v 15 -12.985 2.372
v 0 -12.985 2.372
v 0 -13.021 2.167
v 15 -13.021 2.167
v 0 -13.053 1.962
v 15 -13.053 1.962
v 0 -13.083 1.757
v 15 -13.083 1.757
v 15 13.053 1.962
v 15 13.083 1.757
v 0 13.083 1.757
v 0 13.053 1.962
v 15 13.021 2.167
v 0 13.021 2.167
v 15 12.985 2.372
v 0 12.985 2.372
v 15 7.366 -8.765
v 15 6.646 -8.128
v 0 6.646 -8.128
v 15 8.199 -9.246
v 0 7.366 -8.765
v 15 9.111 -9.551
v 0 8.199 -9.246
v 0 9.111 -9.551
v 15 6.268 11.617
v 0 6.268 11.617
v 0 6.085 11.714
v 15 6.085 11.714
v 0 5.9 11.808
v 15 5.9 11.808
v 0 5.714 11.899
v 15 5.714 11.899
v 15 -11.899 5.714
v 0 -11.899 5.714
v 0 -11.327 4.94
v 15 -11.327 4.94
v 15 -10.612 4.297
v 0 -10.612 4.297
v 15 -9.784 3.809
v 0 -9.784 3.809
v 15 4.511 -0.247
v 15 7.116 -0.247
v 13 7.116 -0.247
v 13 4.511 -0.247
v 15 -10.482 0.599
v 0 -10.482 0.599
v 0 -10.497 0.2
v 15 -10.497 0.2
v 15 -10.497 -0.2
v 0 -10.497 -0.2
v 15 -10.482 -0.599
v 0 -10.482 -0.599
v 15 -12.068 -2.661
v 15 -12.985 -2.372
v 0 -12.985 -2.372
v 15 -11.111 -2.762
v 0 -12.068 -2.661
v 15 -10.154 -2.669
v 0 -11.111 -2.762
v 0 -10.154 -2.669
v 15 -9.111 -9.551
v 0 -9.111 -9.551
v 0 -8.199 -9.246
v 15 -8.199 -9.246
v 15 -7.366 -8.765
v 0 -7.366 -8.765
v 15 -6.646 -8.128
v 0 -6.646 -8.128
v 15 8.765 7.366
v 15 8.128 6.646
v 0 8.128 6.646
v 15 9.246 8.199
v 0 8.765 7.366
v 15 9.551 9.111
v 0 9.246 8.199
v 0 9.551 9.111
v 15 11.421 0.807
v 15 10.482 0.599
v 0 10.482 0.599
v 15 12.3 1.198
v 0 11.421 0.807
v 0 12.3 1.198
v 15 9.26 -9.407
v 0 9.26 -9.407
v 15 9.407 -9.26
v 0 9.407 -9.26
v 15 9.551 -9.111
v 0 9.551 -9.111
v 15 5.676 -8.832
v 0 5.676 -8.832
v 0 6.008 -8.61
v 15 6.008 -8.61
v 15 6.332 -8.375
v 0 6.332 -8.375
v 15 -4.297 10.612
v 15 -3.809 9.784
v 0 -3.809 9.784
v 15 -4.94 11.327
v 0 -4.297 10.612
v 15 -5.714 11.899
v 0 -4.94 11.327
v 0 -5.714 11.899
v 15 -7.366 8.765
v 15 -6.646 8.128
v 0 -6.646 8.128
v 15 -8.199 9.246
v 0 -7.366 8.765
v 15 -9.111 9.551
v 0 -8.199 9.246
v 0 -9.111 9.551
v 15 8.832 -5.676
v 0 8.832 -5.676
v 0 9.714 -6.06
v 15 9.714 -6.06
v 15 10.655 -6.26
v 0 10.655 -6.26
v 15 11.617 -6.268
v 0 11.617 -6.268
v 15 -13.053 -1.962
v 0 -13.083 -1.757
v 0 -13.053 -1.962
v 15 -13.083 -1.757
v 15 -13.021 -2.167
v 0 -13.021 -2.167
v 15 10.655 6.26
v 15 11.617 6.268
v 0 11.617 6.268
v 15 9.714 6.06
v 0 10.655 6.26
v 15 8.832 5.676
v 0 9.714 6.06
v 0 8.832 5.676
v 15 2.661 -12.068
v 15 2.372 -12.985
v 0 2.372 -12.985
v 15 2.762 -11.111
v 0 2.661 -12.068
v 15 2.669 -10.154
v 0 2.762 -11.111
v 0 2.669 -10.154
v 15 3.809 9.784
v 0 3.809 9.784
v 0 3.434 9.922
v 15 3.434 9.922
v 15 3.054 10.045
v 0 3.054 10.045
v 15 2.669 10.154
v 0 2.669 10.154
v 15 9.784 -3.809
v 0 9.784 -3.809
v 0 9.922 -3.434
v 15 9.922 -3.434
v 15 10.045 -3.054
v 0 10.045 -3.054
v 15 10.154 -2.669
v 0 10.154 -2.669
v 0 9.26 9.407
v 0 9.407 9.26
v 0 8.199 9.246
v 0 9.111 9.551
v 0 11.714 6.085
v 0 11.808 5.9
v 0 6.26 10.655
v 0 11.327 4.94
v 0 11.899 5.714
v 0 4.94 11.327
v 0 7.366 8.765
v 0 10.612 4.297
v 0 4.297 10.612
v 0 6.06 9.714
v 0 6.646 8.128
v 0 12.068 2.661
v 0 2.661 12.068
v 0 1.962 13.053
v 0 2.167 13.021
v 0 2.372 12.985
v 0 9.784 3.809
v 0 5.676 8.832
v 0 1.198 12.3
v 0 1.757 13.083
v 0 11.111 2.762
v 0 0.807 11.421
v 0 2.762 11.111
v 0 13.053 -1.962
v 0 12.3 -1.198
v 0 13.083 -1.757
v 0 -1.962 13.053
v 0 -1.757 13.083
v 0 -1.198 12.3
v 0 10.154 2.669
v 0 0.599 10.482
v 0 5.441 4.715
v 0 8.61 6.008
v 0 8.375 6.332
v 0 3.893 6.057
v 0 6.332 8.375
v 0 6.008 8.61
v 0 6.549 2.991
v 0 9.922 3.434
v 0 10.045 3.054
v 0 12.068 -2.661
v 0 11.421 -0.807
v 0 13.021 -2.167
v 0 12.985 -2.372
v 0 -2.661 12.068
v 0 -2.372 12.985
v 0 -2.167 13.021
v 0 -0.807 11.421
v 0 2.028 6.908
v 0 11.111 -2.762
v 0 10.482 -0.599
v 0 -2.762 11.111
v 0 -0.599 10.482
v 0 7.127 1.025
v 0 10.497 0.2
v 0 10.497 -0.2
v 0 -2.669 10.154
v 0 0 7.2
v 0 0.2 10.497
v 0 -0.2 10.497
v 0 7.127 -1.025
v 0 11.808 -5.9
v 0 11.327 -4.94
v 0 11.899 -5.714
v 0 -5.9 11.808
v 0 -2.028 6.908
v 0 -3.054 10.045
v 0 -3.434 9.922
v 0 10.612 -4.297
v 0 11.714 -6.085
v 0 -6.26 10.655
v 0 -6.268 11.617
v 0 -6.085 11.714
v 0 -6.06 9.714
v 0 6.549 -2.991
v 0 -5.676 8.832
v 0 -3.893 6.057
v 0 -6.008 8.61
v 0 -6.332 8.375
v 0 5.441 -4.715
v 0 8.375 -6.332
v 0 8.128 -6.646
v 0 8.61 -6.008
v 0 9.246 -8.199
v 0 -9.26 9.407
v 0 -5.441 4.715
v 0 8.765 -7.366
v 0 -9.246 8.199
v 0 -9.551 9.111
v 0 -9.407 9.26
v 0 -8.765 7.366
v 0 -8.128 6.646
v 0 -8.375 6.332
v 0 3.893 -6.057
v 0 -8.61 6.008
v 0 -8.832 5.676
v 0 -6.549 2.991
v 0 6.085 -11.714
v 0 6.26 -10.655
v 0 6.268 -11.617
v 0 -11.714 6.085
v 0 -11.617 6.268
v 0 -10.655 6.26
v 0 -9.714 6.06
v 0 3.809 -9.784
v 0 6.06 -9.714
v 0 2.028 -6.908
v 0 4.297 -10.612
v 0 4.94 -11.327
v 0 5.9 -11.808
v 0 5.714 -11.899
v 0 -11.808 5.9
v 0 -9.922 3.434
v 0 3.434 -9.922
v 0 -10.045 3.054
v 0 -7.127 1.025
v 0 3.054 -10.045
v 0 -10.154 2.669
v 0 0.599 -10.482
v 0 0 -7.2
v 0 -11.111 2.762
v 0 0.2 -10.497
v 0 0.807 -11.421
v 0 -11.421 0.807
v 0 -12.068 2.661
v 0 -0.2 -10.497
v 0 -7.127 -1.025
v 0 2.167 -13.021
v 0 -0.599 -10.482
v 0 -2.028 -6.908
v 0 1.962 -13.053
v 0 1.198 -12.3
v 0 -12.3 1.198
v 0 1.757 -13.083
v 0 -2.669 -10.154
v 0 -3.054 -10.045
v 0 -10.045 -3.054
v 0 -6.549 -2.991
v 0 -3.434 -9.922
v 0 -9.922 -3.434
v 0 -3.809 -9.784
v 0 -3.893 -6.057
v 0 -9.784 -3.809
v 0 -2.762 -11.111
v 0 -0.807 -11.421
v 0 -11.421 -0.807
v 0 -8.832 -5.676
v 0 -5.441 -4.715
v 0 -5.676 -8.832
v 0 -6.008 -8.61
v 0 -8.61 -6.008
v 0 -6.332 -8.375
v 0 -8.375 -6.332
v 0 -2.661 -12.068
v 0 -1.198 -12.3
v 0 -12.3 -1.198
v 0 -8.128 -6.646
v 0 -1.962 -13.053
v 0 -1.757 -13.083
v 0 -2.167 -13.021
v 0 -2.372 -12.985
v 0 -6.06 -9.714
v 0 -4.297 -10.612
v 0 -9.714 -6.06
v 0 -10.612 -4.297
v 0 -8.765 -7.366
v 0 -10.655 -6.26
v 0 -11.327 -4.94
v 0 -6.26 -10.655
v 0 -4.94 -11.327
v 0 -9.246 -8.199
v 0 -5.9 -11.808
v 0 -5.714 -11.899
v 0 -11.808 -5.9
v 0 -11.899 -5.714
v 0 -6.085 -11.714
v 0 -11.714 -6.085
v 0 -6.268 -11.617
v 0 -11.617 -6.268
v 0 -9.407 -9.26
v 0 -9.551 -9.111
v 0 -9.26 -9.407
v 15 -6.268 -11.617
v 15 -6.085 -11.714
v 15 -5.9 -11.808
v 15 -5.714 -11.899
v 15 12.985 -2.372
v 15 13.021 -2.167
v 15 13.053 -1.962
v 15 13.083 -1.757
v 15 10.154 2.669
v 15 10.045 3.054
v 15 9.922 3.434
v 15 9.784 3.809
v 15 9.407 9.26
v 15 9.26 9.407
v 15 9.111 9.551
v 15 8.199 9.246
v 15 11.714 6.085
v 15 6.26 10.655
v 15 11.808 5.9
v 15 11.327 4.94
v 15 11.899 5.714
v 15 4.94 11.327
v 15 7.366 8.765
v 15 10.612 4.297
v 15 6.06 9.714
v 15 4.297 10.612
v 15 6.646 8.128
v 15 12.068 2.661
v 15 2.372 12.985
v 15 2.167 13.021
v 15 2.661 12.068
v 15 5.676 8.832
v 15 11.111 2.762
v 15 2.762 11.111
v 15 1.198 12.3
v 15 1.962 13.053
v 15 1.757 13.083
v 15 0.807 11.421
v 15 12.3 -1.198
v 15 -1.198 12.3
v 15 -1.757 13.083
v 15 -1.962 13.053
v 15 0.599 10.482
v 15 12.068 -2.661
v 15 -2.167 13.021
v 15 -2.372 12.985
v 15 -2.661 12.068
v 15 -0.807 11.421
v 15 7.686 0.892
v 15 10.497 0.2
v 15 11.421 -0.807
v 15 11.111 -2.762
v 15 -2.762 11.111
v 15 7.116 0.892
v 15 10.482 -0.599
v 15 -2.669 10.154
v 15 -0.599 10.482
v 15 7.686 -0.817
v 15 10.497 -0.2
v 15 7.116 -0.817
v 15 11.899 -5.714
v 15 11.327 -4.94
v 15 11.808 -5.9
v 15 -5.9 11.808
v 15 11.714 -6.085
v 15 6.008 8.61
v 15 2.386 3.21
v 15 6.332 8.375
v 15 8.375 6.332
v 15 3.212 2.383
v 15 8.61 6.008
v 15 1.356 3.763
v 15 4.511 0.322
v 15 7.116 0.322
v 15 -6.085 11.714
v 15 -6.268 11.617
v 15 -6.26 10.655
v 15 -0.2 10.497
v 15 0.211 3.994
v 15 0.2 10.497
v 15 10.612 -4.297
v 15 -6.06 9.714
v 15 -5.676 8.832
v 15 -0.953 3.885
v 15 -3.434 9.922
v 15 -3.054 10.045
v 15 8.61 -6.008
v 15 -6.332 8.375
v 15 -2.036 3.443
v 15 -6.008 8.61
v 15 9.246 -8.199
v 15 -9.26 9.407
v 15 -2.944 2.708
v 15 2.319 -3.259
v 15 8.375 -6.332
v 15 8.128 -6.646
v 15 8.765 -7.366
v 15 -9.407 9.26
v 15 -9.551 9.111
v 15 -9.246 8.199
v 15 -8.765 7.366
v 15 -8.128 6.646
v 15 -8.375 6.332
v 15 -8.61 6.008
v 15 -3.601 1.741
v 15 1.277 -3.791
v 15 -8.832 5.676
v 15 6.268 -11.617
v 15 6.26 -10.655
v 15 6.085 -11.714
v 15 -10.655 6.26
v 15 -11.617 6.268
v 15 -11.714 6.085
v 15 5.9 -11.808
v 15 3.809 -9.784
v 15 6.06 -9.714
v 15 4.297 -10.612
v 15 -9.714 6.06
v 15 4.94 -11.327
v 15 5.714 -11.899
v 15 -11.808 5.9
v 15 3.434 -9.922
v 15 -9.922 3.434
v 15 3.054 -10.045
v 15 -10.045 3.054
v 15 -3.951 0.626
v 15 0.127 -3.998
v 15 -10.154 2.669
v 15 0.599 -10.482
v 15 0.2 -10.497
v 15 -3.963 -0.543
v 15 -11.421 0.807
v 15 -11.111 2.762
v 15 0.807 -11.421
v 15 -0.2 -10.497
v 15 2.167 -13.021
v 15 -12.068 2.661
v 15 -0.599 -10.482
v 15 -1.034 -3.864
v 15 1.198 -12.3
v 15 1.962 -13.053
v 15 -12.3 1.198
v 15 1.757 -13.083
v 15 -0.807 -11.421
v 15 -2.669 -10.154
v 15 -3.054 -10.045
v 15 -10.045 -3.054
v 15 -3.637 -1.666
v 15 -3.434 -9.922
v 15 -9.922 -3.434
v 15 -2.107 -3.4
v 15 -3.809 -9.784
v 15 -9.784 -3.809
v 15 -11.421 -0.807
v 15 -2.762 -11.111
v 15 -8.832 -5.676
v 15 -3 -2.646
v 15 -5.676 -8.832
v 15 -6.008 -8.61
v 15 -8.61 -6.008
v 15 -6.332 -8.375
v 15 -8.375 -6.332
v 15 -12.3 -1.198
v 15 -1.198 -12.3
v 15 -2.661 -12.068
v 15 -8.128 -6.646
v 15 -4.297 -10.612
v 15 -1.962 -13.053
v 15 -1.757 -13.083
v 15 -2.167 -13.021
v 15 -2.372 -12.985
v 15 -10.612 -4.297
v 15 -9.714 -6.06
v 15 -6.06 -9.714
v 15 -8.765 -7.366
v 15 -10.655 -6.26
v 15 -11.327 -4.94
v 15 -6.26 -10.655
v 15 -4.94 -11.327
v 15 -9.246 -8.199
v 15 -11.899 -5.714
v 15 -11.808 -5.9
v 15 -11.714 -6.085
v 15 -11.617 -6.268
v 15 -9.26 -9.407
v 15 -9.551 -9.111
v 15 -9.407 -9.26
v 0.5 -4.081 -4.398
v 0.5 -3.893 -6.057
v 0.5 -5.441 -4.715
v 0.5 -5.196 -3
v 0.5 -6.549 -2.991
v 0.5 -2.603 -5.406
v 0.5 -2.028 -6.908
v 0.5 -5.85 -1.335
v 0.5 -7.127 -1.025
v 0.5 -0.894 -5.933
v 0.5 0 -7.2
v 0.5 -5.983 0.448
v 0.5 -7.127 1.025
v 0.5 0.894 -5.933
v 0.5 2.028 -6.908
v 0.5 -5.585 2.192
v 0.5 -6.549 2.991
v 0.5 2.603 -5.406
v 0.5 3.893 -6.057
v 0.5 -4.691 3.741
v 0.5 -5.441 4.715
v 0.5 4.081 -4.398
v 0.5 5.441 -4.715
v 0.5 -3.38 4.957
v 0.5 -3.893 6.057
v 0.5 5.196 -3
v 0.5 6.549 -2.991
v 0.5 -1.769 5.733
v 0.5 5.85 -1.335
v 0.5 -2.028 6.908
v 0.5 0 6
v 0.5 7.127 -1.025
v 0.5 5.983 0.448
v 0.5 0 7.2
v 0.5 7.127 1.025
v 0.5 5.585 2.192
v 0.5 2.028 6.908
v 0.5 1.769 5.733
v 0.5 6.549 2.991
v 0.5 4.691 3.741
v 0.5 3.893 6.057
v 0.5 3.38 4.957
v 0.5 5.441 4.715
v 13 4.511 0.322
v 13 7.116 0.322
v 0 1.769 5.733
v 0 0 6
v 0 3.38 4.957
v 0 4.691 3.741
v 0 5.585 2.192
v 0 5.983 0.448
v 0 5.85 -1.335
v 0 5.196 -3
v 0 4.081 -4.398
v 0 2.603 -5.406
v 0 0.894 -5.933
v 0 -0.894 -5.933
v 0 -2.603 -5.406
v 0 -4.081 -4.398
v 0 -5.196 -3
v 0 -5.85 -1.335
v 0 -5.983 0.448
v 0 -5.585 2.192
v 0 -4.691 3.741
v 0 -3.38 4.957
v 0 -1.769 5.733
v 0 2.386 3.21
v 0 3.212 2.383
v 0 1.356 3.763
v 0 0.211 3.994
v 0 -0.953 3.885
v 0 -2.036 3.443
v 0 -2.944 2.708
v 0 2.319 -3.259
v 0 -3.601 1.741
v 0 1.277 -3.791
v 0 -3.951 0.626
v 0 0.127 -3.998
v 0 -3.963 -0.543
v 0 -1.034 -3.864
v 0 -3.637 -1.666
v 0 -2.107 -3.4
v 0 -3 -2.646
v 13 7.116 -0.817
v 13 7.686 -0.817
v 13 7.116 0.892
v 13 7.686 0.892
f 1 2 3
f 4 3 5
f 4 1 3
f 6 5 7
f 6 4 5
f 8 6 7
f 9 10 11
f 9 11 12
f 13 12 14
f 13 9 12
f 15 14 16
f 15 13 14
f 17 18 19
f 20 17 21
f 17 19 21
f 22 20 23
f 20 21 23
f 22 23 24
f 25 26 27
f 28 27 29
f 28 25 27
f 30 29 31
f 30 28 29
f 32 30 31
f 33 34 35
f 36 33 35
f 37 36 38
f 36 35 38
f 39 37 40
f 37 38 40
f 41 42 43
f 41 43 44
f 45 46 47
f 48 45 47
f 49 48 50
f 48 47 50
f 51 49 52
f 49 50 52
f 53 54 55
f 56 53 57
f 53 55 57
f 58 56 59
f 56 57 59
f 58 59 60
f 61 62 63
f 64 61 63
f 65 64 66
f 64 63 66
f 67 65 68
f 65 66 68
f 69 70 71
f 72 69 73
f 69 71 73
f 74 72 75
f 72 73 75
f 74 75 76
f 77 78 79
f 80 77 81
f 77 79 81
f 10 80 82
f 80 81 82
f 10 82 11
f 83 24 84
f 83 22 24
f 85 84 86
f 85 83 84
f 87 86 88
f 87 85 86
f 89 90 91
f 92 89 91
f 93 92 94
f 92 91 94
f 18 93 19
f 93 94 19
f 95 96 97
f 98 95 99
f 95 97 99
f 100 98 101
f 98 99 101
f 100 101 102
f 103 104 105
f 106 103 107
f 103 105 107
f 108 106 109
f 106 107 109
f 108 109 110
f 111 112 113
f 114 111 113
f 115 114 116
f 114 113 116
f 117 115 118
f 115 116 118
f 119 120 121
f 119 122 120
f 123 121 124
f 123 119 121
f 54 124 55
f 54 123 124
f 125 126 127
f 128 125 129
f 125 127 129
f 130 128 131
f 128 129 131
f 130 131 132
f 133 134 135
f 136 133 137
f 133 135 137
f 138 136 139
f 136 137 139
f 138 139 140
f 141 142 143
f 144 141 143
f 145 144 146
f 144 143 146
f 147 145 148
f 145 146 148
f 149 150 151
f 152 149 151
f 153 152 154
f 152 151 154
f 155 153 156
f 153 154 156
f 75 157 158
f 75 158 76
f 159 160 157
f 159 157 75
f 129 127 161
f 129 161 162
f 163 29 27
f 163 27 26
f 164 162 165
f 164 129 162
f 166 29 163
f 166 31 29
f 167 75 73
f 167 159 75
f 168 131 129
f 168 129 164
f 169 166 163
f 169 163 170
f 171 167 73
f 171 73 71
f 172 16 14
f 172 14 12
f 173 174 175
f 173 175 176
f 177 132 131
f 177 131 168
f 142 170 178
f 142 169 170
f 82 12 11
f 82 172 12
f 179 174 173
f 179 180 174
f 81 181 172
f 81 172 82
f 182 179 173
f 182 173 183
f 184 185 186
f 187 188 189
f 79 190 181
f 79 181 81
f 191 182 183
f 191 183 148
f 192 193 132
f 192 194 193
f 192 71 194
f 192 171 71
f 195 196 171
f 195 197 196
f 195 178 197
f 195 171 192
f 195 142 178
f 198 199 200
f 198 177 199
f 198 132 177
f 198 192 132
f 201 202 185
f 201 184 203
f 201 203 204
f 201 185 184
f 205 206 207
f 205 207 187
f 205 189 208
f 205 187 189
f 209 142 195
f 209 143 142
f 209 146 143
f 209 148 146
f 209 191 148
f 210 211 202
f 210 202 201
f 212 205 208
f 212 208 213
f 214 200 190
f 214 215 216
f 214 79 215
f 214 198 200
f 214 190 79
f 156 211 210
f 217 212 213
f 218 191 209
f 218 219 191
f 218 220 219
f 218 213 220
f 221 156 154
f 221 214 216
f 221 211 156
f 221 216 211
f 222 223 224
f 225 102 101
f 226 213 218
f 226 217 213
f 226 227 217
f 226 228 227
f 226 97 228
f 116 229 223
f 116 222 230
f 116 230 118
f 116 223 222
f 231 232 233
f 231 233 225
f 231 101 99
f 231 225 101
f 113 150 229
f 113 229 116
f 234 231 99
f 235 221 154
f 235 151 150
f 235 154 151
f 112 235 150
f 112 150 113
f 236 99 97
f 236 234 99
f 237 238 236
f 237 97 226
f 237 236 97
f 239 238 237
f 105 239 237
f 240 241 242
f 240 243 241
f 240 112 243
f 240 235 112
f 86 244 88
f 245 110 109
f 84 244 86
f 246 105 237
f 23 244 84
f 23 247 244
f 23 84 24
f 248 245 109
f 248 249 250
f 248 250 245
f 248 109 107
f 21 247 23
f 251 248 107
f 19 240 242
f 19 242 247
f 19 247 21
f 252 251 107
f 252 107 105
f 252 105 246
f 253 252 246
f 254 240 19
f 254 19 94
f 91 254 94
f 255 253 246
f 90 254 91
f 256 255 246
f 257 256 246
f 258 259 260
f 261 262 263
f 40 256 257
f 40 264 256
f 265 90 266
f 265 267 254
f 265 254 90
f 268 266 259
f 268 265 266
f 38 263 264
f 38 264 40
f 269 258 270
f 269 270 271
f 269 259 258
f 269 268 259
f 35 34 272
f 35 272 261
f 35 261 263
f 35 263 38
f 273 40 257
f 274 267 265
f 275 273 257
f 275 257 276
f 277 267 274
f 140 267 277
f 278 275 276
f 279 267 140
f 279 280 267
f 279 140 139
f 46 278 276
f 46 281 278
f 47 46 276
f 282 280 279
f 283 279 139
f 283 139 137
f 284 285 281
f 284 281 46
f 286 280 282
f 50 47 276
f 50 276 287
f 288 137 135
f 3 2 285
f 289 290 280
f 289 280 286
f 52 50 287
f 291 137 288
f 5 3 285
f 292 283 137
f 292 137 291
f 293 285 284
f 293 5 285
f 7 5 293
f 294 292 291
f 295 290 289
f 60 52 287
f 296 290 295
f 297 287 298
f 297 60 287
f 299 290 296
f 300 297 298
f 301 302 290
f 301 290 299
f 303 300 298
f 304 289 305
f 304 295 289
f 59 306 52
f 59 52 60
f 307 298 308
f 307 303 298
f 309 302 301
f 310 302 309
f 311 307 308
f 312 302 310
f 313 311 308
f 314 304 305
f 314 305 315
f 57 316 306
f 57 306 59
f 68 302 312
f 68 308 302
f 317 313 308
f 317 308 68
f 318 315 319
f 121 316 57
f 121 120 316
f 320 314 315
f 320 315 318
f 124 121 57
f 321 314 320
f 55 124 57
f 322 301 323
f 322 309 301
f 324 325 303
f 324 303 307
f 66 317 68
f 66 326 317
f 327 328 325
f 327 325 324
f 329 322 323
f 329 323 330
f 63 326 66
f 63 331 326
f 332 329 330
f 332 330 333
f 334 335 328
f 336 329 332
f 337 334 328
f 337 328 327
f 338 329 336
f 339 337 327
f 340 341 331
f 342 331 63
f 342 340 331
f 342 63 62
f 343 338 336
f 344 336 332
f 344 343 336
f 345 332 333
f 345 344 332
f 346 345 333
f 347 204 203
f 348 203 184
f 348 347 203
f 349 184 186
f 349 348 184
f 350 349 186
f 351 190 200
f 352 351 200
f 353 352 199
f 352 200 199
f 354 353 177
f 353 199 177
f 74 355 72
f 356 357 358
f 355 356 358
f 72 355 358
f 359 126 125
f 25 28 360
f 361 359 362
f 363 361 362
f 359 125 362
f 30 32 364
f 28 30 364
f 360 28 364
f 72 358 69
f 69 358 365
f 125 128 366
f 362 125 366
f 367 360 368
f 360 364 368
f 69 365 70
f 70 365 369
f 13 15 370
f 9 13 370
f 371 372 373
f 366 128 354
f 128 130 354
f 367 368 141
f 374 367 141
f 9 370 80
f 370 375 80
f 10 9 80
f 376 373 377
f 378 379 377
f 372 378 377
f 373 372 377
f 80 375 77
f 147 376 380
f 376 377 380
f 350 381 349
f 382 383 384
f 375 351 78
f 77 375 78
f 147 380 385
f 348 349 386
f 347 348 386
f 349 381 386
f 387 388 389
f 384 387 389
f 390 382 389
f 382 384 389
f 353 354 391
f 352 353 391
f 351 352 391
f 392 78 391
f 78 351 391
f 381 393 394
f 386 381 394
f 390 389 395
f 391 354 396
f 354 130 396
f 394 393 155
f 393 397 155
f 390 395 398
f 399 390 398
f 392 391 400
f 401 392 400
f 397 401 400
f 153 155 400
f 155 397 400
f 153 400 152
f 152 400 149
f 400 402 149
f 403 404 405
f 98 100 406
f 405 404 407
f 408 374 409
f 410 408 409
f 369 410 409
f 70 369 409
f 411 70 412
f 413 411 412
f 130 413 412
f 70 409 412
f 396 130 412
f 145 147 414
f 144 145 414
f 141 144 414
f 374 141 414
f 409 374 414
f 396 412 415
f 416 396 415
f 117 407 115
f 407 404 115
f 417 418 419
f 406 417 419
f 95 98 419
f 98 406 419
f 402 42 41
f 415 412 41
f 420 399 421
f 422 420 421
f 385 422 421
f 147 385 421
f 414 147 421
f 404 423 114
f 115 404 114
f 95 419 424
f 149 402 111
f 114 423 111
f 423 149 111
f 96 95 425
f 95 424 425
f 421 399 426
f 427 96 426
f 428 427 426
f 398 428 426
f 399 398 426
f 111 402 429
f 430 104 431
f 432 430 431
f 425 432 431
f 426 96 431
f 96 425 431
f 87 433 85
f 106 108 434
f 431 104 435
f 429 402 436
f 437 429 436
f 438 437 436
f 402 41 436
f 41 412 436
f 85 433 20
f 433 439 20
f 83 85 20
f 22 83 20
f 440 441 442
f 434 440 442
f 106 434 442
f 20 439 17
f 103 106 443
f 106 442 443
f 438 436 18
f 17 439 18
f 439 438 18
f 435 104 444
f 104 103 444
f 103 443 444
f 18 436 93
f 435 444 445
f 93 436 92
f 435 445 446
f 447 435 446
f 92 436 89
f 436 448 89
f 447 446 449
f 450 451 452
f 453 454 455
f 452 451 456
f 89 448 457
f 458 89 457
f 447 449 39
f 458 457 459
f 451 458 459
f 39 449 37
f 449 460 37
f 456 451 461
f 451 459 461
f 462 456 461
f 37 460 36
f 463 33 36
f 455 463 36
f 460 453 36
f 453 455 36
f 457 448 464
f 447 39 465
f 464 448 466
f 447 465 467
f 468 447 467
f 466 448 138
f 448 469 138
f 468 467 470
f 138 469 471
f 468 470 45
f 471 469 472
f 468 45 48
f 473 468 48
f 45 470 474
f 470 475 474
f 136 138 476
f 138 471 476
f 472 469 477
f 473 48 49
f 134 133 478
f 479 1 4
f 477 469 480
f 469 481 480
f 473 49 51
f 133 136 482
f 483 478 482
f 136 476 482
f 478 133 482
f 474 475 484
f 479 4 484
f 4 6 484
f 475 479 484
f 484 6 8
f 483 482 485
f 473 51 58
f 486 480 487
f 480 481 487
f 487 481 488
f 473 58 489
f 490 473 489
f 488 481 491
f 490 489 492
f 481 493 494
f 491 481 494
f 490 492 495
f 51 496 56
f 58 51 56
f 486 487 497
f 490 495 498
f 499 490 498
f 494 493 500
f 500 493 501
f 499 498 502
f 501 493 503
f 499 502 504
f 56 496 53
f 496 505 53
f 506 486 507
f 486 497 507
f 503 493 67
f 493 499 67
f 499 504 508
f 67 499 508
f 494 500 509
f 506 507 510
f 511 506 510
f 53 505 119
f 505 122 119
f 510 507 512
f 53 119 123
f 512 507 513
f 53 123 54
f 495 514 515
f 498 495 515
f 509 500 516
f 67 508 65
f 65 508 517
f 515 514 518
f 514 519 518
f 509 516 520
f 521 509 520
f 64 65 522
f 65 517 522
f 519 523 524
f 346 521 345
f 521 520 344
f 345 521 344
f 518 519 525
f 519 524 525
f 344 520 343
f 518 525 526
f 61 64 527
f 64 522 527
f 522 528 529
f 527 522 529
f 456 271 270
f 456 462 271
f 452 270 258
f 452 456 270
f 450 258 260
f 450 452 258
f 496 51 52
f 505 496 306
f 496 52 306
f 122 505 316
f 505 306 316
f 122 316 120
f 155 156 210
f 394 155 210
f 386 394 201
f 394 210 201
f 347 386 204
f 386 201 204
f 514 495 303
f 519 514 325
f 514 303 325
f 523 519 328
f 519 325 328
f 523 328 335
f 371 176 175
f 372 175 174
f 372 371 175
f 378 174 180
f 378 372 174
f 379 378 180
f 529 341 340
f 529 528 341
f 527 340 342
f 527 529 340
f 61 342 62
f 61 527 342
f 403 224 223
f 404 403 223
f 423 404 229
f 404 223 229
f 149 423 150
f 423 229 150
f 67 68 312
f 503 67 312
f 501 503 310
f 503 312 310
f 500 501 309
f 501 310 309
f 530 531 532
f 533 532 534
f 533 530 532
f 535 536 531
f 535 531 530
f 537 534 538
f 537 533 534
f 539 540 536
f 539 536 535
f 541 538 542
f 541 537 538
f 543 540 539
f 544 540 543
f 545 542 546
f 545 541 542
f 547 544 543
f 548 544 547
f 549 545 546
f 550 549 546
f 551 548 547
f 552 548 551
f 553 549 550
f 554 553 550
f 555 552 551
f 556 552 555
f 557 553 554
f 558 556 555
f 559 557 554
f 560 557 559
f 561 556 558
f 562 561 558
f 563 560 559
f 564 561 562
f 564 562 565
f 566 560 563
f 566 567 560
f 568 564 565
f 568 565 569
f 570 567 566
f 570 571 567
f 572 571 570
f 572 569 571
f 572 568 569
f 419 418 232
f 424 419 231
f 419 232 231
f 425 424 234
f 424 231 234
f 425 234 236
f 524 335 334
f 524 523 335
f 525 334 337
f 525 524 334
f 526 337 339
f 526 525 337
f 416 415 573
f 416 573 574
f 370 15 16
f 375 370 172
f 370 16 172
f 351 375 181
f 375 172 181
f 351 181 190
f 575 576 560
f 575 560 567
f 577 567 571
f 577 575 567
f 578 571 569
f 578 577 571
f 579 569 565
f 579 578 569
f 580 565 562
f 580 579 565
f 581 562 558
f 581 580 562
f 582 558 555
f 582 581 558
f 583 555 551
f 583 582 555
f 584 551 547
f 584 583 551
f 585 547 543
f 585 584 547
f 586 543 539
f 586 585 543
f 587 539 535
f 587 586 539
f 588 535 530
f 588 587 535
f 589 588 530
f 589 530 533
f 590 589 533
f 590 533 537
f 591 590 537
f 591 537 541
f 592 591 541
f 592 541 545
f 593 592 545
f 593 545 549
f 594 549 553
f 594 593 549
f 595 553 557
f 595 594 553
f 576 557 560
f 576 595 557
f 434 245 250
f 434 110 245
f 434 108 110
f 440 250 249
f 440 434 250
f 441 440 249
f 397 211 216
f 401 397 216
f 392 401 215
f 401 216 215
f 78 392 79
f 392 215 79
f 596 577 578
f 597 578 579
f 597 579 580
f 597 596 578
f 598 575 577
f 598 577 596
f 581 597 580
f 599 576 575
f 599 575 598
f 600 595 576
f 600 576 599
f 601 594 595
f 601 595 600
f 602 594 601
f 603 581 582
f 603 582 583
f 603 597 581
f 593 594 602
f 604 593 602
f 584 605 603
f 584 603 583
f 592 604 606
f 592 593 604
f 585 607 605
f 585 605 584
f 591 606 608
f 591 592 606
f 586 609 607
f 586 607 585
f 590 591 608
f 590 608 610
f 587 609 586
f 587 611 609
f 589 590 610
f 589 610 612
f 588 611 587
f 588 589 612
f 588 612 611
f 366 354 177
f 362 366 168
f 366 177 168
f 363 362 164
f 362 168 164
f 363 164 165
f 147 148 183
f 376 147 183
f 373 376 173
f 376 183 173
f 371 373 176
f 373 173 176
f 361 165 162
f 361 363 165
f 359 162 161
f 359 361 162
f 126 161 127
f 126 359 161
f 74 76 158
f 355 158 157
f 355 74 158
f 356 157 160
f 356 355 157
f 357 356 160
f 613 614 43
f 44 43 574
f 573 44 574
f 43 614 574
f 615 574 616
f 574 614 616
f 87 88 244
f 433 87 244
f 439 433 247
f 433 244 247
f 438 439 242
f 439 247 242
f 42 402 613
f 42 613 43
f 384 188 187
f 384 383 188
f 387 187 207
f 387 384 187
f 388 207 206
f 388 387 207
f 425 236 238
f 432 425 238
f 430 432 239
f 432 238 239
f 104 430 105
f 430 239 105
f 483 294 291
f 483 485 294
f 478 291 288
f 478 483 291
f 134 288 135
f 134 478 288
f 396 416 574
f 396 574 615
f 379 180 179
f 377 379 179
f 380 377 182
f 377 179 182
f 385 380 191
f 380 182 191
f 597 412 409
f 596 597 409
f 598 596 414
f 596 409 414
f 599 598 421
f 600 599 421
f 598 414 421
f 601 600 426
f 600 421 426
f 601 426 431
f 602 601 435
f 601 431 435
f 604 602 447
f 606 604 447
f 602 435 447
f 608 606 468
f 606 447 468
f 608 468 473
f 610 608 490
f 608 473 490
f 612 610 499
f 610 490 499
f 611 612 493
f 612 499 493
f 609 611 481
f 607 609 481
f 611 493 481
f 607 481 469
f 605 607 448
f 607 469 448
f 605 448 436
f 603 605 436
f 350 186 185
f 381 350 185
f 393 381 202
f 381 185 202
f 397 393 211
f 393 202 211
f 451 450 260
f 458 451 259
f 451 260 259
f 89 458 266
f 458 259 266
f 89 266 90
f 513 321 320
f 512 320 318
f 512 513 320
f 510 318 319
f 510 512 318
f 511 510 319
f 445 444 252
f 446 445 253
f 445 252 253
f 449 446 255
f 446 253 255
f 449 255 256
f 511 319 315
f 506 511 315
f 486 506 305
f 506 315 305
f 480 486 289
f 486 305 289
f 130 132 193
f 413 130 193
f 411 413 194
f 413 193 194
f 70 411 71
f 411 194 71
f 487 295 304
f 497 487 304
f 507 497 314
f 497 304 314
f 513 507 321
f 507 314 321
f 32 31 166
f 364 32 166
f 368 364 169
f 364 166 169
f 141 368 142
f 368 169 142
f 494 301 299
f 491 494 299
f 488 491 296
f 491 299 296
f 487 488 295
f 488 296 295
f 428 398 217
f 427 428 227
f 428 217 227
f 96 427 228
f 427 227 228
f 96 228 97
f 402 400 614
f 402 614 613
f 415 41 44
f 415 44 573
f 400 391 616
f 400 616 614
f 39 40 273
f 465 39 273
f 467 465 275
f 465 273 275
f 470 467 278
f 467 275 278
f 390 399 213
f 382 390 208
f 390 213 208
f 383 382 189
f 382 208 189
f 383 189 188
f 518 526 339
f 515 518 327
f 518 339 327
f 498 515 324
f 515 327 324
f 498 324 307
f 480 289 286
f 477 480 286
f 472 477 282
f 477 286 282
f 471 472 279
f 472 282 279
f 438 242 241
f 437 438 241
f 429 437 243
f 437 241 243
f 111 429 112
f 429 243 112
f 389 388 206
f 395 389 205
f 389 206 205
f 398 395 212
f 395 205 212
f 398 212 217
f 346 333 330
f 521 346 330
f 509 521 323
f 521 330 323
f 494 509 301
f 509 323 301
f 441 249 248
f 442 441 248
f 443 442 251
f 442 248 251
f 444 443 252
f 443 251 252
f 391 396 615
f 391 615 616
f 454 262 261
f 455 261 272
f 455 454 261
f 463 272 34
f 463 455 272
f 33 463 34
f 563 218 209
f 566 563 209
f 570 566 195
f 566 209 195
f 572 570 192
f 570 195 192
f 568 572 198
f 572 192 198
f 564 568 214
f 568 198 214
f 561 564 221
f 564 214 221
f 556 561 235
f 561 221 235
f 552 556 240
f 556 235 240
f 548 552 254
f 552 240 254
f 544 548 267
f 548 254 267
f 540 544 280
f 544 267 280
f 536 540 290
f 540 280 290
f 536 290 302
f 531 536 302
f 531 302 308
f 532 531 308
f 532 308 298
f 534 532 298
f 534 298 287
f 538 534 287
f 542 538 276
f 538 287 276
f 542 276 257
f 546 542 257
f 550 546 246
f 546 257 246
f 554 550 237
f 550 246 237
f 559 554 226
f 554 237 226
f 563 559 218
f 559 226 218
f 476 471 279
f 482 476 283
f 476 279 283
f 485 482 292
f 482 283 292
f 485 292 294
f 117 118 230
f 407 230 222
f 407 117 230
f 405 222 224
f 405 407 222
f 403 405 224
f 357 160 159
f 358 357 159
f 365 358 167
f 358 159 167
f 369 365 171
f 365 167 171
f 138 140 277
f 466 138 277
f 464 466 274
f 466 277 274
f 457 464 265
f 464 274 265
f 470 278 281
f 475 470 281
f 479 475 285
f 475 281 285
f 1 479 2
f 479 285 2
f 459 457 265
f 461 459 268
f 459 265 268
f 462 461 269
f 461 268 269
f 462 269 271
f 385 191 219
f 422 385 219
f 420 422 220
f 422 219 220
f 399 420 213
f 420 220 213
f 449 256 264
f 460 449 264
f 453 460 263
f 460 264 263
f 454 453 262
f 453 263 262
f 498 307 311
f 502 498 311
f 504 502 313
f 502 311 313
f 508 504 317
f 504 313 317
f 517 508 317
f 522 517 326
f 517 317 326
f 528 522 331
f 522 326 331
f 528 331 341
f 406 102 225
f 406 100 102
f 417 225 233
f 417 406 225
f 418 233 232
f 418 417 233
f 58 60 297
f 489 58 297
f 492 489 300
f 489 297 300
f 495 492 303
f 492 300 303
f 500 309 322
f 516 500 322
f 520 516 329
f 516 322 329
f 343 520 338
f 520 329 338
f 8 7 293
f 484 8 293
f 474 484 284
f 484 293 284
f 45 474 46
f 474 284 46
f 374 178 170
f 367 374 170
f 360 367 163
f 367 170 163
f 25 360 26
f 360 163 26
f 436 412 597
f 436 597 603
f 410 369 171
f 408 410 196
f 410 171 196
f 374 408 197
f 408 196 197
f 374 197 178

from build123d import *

# Parameters (mm, degrees)
BASPROSKE_W         = 15
BASPROSKE_H         = 13.2
TOOTHCUT_DEPTH      = 24.947442452
TEETHCUTS_COUNT     = 20
TEETHCUTS_ANGLE     = 342
BORSKE_R            = 4
BORE_DEPTH          = 50.0000508
BOSS_EXTRUDE1_START = -15
BOSS_EXTRUDE1_DEPTH = 15
SKETCH2_R           = 7.2
SKETCH2_R_2         = 6
CUT_EXTRUDE1_DEPTH  = 0.5
CUT_EXTRUDE2_DEPTH  = 2


with BuildPart() as part:
    # BasProSke → Base-Revolve (revolve)
    with BuildSketch(Plane(origin=(0, 0, 0), x_dir=(1, 0, 0), z_dir=(0, 1, 0)), mode=Mode.PRIVATE) as base_revolve_sk:
        with Locations((7.5, 6.6)):
            Rectangle(BASPROSKE_W, BASPROSKE_H)
    revolve(base_revolve_sk.sketch.rotate(Axis((-10, 0, 0), (1, 0, 0)), 180), axis=Axis((-10, 0, 0), (1, 0, 0)))

    # TooCutSke → ToothCut (cut, through all)
    with BuildSketch(Plane(origin=(0, 0, 0), x_dir=(0, 0, -1), z_dir=(1, 0, 0))):
        with BuildLine():
            ThreePointArc((0.599012827, 10.48189795), (0, 10.499), (-0.599012827, 10.48189795))
            ThreePointArc((-0.599012827, 10.48189795), (-0.986906343, 11.883983562), (-1.777012823, 13.105473306))
            ThreePointArc((-1.777012823, 13.105473306), (0, 13.2254), (1.777012823, 13.105473306))
            ThreePointArc((1.777012823, 13.105473306), (0.986906343, 11.883983562), (0.599012827, 10.48189795))
        make_face()
    toothcut = extrude(amount=TOOTHCUT_DEPTH, mode=Mode.SUBTRACT)

    # TeethCuts: ToothCut ×20 about axis
    teethcuts_axis = Axis((-10, 0, 0), (1, 0, 0))
    for i in range(1, TEETHCUTS_COUNT):
        add(toothcut.rotate(teethcuts_axis, i * TEETHCUTS_ANGLE / (TEETHCUTS_COUNT - 1)), mode=Mode.SUBTRACT)

    # BorSke → Bore (cut, symmetric)
    with BuildSketch(Plane(origin=(0, 0, 0), x_dir=(0, 0, -1), z_dir=(1, 0, 0))):
        with Locations(Location((0, 0, 0), (0, 0, 180))):
            Circle(BORSKE_R)
    extrude(amount=BORE_DEPTH, both=True, mode=Mode.SUBTRACT)

    # Sketch1 → Boss-Extrude1 (add)
    with BuildSketch(Plane.ZY.offset(BOSS_EXTRUDE1_START)):
        with BuildLine():
            Line((2.383385736, 3.212393568), (-3.25941874, 2.318661139))
            ThreePointArc((-3.25941874, 2.318661139), (-0.62573786, 3.950753362), (2.383385736, 3.212393568))
        make_face()
    extrude(amount=BOSS_EXTRUDE1_DEPTH)

    # Sketch2 → Cut-Extrude1 (cut)
    with BuildSketch(Plane.ZY):
        Circle(SKETCH2_R)
        Circle(SKETCH2_R_2, mode=Mode.SUBTRACT)
    extrude(amount=-CUT_EXTRUDE1_DEPTH, mode=Mode.SUBTRACT)

    # Sketch3 → Cut-Extrude2 (cut)
    with BuildSketch(Plane(origin=(15, 0, 0), x_dir=(0, 0, -1), z_dir=(1, 0, 0))):
        Polygon((-0.892330227, 7.685800395), (0.817285157, 7.685800395), (0.817285157, 7.1159286), (0.247413362, 7.1159286), (0.247413362, 4.510800395), (-0.322458432, 4.510800395), (-0.322458432, 7.1159286), (-0.892330227, 7.1159286), align=None)
    extrude(amount=-CUT_EXTRUDE2_DEPTH, mode=Mode.SUBTRACT)


solid = part.part
